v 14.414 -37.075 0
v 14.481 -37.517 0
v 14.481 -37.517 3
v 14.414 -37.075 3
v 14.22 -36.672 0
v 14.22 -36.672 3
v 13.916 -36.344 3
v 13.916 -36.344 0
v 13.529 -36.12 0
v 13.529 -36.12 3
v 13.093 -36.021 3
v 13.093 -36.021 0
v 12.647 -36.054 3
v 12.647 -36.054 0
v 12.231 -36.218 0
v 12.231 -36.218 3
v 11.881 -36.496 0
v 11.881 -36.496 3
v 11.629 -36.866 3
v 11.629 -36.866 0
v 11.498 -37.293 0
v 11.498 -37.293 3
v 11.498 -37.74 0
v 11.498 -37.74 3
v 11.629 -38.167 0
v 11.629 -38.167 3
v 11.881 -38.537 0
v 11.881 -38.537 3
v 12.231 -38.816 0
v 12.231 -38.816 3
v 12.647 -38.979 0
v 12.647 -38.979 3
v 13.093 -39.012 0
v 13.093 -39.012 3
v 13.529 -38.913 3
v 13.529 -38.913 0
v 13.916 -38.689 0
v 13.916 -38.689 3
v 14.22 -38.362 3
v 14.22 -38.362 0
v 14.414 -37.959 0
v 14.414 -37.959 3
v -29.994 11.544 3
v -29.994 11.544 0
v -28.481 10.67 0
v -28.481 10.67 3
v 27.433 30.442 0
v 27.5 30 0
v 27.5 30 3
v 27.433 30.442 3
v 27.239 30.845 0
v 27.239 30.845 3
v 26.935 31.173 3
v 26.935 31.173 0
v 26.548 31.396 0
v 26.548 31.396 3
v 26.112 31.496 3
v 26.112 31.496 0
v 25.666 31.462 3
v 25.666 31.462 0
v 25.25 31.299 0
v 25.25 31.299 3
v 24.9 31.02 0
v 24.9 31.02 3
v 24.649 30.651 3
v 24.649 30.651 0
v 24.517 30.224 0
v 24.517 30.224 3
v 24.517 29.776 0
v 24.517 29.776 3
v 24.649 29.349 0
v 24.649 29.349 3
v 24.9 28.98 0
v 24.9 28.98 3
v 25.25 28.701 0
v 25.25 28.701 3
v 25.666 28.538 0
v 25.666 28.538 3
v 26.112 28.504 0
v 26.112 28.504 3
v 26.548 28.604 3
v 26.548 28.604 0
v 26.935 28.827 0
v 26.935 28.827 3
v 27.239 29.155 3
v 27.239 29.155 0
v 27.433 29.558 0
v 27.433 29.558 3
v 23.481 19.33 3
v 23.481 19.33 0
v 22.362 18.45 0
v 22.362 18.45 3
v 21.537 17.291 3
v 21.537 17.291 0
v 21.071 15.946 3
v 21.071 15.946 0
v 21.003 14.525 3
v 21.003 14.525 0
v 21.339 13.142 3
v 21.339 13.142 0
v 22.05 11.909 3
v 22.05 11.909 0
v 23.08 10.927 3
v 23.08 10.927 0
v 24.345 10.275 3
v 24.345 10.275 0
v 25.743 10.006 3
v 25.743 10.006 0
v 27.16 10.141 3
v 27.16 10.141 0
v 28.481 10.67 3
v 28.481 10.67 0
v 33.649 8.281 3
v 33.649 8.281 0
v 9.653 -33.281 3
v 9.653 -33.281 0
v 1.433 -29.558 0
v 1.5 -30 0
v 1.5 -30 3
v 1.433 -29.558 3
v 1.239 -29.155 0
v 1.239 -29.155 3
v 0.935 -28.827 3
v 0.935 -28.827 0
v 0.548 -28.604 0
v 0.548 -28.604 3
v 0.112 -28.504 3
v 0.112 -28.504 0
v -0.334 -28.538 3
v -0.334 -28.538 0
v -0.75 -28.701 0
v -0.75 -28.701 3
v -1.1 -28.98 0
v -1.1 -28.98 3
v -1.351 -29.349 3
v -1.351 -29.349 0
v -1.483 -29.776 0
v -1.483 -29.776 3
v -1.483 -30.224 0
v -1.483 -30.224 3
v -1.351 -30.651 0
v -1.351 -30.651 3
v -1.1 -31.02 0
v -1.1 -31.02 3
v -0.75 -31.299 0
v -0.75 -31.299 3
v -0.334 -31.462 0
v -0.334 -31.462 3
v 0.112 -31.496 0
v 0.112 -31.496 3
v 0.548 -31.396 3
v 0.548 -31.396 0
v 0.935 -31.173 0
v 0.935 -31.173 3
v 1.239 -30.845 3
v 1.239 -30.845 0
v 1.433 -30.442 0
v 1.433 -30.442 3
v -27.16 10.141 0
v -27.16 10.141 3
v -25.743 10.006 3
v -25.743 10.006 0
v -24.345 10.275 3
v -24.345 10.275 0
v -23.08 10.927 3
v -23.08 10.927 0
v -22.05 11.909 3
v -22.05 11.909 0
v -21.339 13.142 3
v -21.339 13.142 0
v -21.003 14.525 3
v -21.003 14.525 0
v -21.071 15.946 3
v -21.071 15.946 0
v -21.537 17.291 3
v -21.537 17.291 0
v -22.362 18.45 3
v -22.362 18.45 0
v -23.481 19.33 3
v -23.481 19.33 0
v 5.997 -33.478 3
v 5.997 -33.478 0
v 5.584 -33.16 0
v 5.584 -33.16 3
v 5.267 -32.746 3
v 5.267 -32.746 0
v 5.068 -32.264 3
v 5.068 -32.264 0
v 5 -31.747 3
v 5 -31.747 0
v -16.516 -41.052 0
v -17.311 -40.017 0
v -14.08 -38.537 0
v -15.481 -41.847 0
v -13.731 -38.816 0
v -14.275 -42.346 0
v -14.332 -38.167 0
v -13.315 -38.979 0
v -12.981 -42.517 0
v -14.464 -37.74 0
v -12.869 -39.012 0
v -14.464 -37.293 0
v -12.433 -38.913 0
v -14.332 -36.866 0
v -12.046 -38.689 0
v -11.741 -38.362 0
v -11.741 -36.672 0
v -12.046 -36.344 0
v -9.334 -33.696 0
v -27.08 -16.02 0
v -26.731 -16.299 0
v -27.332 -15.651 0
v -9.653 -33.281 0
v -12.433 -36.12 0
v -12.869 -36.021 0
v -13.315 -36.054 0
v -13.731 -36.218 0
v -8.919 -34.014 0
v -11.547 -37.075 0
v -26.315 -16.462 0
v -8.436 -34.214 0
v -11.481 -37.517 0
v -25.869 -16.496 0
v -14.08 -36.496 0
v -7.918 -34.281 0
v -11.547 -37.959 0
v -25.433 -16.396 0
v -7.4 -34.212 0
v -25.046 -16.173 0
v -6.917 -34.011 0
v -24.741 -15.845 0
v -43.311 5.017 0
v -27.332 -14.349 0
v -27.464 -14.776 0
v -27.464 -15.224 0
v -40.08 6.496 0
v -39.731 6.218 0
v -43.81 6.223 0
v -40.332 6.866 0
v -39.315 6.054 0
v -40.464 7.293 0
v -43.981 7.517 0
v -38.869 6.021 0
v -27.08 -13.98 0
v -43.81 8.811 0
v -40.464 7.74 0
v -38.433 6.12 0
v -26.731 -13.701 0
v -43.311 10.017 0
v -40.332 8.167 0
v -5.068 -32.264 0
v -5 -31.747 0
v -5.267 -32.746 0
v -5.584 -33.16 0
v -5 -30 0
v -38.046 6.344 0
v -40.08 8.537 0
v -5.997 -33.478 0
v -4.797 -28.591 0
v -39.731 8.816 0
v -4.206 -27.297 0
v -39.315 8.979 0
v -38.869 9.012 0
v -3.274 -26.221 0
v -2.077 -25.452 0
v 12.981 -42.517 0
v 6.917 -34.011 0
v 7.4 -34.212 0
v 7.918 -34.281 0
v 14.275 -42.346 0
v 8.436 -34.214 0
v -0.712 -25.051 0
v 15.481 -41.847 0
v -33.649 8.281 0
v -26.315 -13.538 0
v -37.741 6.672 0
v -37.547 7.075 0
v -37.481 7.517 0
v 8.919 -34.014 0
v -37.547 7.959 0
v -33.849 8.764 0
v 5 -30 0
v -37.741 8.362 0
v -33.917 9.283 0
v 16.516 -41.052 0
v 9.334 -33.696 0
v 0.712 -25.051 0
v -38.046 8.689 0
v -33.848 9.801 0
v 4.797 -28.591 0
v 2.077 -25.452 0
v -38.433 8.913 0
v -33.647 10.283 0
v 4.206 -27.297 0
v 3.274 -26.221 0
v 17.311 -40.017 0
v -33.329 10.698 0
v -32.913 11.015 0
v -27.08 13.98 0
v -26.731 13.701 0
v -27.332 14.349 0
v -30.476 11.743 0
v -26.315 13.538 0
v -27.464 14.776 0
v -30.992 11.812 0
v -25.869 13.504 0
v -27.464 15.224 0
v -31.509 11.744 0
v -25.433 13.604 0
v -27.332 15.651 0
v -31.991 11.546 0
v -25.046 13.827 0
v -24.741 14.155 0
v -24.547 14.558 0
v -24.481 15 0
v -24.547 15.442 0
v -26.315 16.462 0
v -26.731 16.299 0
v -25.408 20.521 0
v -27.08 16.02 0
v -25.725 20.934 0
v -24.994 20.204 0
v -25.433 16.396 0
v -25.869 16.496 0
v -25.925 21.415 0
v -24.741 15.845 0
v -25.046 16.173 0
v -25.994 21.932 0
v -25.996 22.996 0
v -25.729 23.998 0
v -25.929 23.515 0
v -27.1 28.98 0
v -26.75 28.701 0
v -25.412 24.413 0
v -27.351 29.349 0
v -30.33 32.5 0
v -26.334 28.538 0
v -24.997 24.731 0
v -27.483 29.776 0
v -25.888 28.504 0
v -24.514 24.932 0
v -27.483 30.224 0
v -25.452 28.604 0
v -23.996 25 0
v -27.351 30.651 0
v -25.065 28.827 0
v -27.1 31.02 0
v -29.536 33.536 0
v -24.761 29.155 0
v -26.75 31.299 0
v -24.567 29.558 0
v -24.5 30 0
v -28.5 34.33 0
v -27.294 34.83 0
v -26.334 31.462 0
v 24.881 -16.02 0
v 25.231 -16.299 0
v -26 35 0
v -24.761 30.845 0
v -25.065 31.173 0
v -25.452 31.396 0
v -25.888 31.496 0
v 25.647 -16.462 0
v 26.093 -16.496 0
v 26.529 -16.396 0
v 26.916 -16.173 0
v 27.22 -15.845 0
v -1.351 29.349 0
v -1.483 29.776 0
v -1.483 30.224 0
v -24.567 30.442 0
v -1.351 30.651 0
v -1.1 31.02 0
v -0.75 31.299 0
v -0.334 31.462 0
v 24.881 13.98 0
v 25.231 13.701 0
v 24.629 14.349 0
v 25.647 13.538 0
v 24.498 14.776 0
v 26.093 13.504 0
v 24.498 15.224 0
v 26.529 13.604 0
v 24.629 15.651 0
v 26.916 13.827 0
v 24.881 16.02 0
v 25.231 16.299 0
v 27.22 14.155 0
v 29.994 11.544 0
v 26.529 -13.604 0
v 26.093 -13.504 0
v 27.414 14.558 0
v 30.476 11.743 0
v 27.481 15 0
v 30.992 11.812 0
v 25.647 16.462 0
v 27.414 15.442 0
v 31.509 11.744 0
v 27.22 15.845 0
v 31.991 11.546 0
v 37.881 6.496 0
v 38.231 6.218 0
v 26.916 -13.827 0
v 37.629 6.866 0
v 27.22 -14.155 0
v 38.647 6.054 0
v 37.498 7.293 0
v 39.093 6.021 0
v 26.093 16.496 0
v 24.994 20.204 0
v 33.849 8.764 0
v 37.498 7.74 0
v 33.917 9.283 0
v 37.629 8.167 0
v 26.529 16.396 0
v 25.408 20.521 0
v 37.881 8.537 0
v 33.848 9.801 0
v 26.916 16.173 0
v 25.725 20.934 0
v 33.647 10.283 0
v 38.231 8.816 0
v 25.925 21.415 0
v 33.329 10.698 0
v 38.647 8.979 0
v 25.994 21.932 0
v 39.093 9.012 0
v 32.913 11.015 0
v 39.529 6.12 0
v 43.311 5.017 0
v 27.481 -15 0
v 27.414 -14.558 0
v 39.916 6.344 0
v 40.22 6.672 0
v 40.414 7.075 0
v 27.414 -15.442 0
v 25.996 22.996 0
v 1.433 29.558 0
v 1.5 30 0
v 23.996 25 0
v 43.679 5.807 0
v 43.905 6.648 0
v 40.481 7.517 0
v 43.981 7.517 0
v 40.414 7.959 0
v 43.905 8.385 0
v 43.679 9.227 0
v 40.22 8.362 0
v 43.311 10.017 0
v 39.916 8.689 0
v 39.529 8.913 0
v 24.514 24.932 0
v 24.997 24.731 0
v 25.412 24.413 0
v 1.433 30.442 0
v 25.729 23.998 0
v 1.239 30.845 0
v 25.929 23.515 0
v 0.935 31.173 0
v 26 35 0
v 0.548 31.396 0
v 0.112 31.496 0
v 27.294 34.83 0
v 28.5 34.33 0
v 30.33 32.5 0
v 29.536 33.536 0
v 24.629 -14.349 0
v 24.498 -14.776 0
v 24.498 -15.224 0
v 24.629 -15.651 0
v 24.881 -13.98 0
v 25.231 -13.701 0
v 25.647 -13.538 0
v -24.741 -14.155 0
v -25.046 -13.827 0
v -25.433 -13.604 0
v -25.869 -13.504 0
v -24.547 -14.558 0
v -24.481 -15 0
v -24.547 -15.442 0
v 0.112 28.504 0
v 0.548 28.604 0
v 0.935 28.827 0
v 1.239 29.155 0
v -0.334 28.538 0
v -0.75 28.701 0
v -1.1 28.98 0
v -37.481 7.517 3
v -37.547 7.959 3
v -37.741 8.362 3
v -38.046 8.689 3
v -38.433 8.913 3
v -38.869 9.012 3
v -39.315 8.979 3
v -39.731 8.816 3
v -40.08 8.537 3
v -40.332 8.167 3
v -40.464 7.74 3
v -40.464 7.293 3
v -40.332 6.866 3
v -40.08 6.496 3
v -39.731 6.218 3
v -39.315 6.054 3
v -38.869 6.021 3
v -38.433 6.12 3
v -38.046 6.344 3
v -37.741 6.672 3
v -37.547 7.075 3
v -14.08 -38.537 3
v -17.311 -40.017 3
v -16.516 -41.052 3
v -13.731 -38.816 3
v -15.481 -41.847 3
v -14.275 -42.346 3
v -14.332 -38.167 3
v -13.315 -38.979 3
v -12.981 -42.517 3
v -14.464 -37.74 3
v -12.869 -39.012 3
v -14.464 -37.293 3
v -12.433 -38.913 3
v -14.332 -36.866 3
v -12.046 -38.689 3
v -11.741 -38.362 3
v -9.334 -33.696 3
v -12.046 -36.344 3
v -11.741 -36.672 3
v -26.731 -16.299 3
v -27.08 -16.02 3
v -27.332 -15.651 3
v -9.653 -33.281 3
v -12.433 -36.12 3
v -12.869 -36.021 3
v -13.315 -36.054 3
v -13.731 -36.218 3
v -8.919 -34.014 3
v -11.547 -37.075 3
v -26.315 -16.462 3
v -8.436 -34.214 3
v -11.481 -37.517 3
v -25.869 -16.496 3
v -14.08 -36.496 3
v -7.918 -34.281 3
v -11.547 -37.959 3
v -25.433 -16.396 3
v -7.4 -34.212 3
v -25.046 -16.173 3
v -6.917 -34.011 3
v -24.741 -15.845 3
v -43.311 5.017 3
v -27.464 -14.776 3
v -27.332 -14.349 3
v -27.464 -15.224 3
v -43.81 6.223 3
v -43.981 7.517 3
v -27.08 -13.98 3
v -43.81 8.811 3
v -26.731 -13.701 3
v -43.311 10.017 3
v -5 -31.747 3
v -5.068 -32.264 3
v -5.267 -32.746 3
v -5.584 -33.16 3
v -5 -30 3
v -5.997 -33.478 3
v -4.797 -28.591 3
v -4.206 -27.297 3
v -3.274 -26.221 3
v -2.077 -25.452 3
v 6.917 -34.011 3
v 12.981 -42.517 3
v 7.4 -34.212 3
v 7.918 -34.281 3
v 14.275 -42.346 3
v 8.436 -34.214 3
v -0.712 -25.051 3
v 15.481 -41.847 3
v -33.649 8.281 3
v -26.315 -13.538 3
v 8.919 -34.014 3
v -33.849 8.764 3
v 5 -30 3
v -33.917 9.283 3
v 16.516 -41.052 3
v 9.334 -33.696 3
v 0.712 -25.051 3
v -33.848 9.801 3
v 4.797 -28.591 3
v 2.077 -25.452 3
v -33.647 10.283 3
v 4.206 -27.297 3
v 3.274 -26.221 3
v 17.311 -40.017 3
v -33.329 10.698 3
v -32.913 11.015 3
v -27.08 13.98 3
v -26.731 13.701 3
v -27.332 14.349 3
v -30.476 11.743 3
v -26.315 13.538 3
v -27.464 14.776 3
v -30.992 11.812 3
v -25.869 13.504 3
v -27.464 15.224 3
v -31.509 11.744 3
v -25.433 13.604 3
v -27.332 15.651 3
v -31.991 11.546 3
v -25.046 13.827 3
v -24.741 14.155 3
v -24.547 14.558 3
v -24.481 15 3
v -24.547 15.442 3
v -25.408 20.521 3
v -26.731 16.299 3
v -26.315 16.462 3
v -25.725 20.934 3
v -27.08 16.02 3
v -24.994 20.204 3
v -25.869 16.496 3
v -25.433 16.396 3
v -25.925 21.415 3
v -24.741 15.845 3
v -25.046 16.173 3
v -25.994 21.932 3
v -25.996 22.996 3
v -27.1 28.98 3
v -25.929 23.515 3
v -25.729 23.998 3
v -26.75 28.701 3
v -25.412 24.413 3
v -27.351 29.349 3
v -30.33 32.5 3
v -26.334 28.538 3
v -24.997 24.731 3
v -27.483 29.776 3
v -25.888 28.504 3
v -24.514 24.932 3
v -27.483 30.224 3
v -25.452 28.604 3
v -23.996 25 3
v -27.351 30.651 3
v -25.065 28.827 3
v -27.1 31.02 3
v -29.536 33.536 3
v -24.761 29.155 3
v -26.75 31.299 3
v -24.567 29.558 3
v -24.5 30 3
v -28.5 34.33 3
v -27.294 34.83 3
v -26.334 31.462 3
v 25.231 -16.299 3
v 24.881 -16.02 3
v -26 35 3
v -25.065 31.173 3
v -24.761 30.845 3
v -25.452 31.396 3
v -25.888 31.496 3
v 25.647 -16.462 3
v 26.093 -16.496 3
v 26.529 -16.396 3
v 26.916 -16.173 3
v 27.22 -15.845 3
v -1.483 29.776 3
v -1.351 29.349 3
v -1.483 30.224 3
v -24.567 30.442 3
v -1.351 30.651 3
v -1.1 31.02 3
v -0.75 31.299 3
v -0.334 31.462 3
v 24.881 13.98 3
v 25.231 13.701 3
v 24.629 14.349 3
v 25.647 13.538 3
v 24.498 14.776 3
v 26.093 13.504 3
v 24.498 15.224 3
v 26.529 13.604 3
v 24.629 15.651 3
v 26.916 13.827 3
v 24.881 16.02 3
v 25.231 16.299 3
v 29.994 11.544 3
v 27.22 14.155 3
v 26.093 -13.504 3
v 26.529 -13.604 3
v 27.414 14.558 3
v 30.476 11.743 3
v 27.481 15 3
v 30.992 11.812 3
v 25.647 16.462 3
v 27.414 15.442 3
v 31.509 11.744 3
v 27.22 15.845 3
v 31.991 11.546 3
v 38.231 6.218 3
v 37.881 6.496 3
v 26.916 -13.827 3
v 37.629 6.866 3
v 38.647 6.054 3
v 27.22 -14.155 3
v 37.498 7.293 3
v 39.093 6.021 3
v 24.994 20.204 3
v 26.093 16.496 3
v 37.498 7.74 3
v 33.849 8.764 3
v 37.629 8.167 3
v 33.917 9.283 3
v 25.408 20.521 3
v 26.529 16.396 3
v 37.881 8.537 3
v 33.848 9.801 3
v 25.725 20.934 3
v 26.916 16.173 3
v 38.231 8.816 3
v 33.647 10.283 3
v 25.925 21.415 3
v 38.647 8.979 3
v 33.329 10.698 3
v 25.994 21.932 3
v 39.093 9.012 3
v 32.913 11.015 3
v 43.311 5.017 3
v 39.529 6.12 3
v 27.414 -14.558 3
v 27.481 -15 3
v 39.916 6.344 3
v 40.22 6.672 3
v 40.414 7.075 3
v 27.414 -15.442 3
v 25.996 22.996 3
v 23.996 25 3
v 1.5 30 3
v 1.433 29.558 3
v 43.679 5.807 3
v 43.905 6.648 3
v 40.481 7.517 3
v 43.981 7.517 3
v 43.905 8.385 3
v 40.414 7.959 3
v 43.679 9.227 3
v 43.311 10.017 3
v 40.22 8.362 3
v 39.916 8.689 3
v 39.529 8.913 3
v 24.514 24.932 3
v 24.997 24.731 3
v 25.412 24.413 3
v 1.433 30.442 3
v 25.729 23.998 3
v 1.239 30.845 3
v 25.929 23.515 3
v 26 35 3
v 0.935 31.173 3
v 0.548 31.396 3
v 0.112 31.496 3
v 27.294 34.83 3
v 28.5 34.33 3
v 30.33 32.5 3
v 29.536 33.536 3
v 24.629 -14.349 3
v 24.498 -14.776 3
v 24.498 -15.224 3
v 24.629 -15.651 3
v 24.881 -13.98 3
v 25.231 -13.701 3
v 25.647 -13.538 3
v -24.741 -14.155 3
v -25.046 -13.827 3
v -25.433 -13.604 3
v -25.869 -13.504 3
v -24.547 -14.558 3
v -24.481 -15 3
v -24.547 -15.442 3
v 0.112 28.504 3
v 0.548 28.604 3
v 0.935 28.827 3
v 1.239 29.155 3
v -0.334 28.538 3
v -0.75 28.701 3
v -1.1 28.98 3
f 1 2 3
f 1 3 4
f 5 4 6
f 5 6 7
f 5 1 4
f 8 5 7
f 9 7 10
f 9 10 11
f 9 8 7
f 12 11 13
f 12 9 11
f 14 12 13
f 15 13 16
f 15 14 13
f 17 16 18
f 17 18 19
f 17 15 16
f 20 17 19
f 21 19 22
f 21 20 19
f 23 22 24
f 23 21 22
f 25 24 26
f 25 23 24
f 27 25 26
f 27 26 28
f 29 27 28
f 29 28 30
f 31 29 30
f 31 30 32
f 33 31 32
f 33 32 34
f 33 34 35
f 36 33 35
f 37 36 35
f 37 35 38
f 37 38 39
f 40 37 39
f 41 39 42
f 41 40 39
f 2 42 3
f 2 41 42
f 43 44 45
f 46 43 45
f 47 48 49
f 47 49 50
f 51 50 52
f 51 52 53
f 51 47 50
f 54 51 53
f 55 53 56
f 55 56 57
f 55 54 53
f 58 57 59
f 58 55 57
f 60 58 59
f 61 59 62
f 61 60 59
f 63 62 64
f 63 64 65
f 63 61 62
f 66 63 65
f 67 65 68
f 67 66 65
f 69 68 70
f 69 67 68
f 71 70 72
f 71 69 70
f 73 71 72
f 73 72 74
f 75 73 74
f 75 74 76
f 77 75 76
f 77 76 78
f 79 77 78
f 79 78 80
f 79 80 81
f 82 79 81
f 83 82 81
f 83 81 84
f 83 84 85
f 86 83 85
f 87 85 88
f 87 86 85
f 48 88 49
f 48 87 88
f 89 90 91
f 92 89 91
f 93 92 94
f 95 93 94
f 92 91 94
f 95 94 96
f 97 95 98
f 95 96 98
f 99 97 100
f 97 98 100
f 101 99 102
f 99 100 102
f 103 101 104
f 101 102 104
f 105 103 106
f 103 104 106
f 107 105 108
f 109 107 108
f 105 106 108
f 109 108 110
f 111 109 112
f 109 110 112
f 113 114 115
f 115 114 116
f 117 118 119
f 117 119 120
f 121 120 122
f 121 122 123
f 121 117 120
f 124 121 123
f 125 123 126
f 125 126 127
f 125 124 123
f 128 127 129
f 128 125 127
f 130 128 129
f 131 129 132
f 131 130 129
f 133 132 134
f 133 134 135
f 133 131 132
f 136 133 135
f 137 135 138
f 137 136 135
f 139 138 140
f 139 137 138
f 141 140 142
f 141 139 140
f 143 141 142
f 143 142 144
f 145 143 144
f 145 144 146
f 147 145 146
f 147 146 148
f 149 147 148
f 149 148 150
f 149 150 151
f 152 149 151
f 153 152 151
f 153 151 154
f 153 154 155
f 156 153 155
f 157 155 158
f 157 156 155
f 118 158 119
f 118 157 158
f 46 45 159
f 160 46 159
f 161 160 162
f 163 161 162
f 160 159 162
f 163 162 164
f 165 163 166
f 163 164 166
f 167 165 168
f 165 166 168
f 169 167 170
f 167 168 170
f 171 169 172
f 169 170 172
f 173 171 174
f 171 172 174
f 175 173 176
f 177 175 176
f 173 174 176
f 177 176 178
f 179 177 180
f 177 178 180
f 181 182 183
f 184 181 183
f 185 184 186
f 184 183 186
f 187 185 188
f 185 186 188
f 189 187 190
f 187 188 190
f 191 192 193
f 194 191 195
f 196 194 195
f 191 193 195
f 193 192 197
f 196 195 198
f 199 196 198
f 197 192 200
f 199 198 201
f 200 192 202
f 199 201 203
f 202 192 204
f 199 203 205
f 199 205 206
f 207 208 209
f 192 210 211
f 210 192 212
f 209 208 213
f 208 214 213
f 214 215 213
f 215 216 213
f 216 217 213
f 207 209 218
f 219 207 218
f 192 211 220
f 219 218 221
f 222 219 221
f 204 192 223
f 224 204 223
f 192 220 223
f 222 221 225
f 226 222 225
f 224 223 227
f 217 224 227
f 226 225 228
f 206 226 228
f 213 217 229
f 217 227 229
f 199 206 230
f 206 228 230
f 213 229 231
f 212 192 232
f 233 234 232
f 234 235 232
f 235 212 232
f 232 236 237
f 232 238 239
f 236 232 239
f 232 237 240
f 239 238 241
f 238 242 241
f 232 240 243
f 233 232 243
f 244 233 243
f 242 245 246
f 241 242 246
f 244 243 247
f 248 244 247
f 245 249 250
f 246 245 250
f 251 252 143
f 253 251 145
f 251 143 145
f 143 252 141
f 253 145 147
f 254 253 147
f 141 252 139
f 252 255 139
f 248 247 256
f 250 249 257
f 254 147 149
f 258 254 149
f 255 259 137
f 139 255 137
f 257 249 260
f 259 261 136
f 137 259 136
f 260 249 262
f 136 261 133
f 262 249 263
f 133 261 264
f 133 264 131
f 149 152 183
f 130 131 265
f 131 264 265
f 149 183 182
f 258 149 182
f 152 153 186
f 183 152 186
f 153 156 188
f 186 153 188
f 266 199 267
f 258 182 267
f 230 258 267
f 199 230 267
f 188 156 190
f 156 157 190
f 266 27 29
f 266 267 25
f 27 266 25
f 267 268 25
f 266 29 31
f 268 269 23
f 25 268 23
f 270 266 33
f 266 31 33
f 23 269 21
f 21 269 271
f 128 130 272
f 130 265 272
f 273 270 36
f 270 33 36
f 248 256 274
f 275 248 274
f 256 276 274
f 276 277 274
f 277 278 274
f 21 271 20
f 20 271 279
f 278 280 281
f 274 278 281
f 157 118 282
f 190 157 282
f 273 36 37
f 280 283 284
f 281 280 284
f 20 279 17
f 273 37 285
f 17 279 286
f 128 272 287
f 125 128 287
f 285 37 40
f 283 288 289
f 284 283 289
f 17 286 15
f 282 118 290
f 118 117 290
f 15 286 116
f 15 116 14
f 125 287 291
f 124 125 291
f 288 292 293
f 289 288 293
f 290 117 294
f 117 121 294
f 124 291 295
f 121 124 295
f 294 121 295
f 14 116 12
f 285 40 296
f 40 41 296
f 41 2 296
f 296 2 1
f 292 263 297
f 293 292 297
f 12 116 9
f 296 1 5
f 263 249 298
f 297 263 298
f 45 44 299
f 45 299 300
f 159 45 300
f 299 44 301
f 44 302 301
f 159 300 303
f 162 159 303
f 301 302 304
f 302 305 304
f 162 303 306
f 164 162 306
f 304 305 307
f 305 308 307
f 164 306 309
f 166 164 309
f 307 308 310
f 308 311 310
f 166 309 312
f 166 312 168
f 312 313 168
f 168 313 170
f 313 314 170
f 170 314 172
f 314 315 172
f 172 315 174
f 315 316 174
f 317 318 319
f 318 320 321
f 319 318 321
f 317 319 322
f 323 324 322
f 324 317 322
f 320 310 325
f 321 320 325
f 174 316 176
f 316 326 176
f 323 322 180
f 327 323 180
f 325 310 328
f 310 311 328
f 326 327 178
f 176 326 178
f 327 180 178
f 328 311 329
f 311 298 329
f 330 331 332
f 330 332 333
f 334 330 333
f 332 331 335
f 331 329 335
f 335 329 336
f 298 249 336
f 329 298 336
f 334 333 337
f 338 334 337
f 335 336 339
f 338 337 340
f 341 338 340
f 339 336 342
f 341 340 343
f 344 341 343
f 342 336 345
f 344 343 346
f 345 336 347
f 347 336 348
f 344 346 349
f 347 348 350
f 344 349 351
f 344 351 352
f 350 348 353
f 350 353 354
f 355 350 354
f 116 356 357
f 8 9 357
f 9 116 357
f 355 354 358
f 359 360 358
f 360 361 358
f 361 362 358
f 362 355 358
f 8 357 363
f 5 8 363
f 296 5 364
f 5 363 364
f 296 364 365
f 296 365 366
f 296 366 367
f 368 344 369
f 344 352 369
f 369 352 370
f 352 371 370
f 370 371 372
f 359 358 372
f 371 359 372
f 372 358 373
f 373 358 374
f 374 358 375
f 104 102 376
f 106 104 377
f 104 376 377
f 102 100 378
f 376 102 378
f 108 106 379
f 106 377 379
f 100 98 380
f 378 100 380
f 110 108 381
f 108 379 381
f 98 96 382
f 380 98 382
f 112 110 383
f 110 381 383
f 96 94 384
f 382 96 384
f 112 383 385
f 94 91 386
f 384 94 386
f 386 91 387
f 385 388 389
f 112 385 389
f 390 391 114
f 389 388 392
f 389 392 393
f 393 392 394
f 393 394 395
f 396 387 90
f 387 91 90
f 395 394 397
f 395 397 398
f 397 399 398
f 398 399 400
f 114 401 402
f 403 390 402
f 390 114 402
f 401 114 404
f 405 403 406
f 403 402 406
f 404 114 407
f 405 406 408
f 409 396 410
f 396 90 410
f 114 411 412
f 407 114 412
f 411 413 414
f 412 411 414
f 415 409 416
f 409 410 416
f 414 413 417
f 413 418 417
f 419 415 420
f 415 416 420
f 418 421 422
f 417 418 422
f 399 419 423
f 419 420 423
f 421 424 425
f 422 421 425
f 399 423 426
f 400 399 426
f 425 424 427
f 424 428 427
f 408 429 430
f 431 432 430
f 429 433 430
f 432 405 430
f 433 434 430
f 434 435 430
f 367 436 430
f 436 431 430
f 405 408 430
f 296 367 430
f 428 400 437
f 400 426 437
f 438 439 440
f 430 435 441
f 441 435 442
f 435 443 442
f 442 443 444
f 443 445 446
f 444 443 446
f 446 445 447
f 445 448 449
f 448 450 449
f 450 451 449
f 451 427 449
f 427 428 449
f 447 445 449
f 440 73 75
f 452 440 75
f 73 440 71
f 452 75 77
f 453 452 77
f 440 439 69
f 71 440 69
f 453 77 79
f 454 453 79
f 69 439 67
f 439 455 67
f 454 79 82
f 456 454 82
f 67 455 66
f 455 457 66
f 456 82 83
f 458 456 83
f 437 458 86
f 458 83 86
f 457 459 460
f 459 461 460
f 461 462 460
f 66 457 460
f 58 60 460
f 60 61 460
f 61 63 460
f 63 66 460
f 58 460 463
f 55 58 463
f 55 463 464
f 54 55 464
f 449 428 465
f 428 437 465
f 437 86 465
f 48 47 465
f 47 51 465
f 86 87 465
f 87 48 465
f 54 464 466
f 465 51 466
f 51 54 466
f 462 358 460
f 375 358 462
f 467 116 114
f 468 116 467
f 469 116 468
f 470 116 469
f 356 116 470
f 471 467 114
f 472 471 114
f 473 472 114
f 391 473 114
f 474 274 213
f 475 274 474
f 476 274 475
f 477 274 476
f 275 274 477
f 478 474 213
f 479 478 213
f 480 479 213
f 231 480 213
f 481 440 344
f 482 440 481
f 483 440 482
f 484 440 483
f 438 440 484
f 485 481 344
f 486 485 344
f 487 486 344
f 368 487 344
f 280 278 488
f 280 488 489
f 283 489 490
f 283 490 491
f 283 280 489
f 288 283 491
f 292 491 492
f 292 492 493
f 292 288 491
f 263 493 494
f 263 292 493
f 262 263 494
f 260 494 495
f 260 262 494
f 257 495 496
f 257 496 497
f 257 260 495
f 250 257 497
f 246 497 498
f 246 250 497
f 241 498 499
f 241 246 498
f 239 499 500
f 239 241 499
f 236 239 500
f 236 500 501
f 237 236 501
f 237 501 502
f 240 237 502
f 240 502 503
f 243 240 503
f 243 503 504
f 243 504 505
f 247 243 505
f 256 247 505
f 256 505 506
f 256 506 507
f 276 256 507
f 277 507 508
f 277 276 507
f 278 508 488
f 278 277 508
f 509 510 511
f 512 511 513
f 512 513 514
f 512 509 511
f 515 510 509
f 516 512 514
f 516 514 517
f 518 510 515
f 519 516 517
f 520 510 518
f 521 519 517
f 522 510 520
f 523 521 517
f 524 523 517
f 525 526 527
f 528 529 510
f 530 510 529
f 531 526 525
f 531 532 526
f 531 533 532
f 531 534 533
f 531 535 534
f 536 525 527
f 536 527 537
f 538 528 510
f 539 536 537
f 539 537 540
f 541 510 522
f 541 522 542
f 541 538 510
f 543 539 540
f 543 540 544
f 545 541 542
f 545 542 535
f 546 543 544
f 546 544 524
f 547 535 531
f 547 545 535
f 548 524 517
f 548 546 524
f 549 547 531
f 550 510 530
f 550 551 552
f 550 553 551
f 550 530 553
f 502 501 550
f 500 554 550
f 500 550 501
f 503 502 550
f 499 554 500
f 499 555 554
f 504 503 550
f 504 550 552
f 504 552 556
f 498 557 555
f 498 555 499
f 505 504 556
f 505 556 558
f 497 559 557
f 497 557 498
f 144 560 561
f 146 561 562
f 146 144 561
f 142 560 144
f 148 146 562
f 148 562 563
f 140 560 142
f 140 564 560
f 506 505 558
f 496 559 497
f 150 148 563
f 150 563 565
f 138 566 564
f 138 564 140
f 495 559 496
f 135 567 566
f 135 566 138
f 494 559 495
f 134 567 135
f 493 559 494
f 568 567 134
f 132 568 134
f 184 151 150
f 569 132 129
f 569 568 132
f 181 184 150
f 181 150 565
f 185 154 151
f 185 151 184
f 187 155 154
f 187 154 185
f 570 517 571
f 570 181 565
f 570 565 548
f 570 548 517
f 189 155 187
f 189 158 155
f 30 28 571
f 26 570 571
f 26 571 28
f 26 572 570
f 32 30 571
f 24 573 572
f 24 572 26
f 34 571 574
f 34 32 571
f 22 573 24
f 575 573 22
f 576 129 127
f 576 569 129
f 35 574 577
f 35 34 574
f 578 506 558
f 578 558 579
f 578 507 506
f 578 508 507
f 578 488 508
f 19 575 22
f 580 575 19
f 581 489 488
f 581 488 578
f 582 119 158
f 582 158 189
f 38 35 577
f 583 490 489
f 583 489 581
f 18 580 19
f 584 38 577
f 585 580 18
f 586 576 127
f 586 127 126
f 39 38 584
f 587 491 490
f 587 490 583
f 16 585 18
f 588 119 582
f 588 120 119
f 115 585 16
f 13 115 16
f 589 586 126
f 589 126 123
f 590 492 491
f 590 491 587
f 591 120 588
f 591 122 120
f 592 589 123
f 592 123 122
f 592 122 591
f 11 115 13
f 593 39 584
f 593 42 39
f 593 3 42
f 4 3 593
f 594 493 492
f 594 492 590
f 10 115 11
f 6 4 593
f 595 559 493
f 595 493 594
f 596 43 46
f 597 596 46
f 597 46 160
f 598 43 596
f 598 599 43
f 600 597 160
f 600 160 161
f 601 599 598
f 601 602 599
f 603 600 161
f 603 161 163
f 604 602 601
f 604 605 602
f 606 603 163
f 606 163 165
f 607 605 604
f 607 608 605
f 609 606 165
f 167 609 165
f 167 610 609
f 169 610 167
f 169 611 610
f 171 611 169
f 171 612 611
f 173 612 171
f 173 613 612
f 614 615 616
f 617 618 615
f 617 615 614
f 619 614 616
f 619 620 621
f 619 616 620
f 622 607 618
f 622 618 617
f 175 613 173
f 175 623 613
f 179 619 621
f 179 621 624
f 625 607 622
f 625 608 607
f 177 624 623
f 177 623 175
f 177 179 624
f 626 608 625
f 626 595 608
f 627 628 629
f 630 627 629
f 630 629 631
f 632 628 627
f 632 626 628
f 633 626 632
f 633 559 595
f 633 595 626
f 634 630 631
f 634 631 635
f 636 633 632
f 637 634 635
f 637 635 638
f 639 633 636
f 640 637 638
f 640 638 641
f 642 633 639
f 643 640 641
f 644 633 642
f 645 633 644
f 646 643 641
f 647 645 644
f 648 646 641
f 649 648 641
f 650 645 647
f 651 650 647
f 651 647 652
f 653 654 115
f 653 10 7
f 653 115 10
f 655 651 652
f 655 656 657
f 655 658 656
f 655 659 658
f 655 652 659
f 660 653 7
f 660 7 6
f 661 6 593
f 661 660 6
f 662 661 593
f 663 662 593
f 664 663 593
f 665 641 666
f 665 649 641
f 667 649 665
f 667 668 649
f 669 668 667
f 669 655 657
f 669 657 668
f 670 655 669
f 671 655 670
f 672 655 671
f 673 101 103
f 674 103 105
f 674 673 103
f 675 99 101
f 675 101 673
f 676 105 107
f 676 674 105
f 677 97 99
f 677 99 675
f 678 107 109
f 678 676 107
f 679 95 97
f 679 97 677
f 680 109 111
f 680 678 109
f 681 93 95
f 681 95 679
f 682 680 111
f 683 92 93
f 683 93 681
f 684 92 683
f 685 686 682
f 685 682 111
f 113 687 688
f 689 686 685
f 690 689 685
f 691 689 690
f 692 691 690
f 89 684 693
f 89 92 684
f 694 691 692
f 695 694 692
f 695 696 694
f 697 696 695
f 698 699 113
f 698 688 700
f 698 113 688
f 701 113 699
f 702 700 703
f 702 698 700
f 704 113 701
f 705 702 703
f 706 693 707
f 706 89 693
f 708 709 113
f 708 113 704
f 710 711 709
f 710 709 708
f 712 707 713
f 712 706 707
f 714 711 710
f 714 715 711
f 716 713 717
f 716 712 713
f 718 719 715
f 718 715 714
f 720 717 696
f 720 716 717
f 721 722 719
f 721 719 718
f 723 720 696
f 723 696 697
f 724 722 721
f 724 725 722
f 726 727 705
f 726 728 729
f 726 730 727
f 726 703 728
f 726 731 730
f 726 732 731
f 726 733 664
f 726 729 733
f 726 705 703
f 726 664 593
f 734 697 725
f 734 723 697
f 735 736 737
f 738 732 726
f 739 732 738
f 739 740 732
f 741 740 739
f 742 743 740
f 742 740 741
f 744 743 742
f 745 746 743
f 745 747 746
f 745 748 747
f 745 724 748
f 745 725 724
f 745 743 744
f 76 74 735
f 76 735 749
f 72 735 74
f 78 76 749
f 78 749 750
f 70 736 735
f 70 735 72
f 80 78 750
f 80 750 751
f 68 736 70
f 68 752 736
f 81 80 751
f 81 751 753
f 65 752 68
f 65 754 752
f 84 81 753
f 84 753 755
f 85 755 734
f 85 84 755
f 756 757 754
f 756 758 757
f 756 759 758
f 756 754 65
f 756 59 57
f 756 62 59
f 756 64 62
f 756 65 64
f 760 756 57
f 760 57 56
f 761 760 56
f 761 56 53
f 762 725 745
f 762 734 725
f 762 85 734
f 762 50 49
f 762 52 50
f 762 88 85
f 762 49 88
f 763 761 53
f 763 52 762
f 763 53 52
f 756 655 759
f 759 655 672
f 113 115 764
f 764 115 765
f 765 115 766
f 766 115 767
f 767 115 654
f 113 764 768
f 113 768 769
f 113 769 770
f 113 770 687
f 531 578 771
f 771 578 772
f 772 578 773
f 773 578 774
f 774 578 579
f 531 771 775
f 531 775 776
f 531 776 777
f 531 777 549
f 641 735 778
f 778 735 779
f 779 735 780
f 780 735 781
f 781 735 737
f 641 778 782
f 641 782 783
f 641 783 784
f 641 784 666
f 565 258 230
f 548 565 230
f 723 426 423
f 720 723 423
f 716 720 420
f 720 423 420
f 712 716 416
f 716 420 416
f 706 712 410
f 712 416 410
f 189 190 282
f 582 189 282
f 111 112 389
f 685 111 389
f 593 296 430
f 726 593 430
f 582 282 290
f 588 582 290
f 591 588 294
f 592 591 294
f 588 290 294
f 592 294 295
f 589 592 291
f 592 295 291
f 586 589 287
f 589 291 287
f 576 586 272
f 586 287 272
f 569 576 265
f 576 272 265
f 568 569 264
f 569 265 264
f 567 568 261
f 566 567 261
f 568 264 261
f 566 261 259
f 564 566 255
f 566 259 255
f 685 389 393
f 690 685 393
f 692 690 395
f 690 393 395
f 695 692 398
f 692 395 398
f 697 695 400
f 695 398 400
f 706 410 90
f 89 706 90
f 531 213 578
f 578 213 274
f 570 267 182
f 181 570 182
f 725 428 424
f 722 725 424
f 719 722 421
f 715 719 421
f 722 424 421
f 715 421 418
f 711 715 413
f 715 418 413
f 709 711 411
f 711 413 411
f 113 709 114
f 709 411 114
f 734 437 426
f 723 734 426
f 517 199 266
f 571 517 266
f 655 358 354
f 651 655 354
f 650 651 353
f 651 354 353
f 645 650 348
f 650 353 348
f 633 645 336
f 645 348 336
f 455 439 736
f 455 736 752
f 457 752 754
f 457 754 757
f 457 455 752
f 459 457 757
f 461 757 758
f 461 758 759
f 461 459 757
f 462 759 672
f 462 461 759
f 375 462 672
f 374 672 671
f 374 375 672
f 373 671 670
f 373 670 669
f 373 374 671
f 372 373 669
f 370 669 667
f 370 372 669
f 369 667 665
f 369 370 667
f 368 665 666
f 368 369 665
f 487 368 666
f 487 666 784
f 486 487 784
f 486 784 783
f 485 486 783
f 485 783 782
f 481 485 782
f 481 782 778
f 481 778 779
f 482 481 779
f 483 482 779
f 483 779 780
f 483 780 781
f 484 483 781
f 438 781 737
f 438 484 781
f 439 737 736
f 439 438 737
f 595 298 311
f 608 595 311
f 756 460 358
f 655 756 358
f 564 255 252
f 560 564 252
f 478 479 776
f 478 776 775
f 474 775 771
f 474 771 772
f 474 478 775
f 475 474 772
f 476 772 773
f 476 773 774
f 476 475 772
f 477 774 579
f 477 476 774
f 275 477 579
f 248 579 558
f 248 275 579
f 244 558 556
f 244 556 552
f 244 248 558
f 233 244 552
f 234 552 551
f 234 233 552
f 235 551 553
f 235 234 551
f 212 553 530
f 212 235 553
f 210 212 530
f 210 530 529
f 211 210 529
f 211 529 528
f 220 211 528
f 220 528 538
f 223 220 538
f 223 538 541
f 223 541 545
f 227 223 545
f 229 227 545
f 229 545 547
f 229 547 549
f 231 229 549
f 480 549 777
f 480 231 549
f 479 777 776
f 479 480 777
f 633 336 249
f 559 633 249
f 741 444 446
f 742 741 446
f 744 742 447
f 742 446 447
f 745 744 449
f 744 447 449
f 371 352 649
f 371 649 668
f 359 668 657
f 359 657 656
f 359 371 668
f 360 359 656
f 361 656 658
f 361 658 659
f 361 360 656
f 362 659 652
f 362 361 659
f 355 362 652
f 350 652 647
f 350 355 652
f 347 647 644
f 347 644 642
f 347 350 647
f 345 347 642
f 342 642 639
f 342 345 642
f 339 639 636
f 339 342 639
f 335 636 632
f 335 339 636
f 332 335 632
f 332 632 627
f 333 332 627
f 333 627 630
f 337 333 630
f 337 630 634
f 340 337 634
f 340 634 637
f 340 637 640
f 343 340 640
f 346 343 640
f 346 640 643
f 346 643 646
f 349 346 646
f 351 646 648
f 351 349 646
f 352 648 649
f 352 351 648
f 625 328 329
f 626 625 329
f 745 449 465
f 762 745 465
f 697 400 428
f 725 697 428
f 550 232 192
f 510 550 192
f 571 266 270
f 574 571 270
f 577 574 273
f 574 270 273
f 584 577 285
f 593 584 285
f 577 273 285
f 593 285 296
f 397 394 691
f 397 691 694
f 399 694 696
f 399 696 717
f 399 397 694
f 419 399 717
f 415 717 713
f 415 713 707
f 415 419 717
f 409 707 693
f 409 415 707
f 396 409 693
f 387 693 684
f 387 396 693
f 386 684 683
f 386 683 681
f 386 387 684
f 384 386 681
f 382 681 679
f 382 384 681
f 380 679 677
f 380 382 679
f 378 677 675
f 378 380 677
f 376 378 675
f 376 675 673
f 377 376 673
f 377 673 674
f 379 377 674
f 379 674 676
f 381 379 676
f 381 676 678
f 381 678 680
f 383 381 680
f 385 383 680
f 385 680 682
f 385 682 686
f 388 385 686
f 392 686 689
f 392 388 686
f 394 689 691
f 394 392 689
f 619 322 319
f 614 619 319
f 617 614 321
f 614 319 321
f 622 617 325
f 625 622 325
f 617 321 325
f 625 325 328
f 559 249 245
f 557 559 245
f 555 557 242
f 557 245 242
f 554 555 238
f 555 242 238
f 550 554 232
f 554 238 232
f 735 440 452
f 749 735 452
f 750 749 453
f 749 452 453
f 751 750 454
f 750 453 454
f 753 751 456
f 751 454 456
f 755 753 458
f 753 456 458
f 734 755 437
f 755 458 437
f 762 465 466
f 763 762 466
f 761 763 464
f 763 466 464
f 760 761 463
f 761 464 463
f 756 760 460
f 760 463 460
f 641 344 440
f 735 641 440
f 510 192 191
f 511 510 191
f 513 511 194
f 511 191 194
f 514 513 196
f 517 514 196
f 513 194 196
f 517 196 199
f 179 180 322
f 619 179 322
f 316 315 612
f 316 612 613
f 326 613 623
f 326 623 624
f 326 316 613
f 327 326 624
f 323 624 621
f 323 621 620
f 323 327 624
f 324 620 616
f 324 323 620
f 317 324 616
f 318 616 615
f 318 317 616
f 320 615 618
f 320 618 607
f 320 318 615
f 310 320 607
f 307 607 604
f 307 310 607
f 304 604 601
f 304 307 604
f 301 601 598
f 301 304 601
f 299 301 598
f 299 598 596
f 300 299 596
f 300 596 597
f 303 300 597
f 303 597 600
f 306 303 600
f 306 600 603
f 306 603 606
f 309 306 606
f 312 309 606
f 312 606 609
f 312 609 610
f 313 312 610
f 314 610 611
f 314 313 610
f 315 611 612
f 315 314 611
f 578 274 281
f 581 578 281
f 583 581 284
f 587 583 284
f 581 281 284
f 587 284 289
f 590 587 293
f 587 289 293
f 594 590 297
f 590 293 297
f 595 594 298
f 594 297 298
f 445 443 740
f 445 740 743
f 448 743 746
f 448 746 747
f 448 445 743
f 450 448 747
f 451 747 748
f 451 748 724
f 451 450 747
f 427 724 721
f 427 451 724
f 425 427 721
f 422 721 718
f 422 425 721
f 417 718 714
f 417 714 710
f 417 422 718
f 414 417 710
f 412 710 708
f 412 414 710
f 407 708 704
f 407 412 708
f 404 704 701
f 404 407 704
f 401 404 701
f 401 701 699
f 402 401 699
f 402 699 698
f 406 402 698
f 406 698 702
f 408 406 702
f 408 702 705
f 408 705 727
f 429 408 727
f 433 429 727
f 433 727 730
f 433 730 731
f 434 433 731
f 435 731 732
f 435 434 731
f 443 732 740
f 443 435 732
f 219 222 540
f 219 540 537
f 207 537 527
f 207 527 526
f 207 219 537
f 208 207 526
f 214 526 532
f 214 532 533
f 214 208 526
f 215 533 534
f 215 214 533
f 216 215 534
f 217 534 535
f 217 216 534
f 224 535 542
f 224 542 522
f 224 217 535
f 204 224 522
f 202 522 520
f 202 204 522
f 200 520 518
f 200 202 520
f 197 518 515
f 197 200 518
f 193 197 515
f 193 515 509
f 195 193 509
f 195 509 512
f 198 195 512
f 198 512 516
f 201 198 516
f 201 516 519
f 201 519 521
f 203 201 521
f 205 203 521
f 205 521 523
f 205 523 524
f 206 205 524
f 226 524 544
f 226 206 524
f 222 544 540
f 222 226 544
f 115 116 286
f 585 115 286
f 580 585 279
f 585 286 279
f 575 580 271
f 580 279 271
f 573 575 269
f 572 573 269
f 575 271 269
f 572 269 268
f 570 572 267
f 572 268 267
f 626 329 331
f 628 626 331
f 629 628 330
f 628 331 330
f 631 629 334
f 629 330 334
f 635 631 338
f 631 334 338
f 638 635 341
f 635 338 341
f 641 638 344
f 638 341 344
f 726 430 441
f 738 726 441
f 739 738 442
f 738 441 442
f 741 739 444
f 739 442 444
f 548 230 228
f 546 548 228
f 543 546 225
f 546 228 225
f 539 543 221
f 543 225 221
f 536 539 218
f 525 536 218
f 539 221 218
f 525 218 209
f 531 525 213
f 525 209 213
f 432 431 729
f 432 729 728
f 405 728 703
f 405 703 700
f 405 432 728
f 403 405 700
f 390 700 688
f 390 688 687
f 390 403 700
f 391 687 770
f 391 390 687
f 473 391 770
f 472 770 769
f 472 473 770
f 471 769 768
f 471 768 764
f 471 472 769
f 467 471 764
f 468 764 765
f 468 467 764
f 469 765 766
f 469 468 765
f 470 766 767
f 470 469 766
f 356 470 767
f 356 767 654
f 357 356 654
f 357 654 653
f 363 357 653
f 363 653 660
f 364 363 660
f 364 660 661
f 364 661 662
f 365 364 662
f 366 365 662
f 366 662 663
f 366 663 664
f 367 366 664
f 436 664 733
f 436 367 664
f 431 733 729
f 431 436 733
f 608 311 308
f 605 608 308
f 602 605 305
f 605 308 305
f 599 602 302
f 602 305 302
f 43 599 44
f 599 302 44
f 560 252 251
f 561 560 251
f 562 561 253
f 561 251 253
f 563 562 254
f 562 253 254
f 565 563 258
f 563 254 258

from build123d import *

# Parameters (mm, degrees)
F0_R     = 1.5
F1_DEPTH = 3


with BuildPart() as f1:
    # F0 (on Top) → F1 (new body)
    with BuildSketch(Plane.XY):
        with BuildLine():
            ThreePointArc((26, 35), (22.464466, 26.464466), (31, 30))
            ThreePointArc((31, 30), (30.829629, 31.294095), (30.330127, 32.5))
            ThreePointArc((30.330127, 32.5), (28.5, 34.330127), (26, 35))
        make_face()
        with Locations((26, 30)):
            Circle(F0_R, mode=Mode.SUBTRACT)
        with BuildLine():
            ThreePointArc((30.330127, 32.5), (30.829629, 31.294095), (31, 30))
            ThreePointArc((31, 30), (22.464466, 26.464466), (26, 35))
            Line((26, 35), (-26, 35))
            ThreePointArc((-26, 35), (-22.464466, 33.535534), (-21, 30))
            ThreePointArc((-21, 30), (-27.294095, 25.170371), (-30.330127, 32.5))
            Line((-30.330127, 32.5), (-43.310889, 10.01666))
            ThreePointArc((-43.310889, 10.01666), (-37.686667, 12.34629), (-33.980762, 7.51666))
            ThreePointArc((-33.980762, 7.51666), (-37.686667, 2.687031), (-43.310889, 5.01666))
            Line((-43.310889, 5.01666), (-17.310889, -40.01666))
            ThreePointArc((-17.310889, -40.01666), (-14.274857, -32.687031), (-7.980762, -37.51666))
            ThreePointArc((-7.980762, -37.51666), (-9.445228, -41.052194), (-12.980762, -42.51666))
            Line((-12.980762, -42.51666), (12.980762, -42.51666))
            ThreePointArc((12.980762, -42.51666), (9.445228, -33.981127), (17.980762, -37.51666))
            ThreePointArc((17.980762, -37.51666), (17.810391, -38.810756), (17.310889, -40.01666))
            Line((17.310889, -40.01666), (43.310889, 5.01666))
            ThreePointArc((43.310889, 5.01666), (33.980762, 7.51666), (43.310889, 10.01666))
            Line((43.310889, 10.01666), (30.330127, 32.5))
        make_face()
        with Locations((-25.980762, -15)):
            Circle(F0_R, mode=Mode.SUBTRACT)
        with BuildLine():
            ThreePointArc((32.913325, 11.015246), (33.848011, 9.80077), (33.648709, 8.281274))
            Line((33.648709, 8.281274), (9.652561, -33.281274))
            ThreePointArc((9.652561, -33.281274), (8.43629, -34.213623), (6.91718, -34.011398))
            Line((6.91718, -34.011398), (5.99667, -33.477578))
            ThreePointArc((5.99667, -33.477578), (5.266988, -32.745787), (5, -31.747454))
            Line((5, -31.747454), (5, -30))
            ThreePointArc((5, -30), (0, -25), (-5, -30))
            Line((-5, -30), (-5, -31.747454))
            ThreePointArc((-5, -31.747454), (-5.266988, -32.745787), (-5.99667, -33.477578))
            Line((-5.99667, -33.477578), (-6.91718, -34.011398))
            ThreePointArc((-6.91718, -34.011398), (-8.43629, -34.213623), (-9.652561, -33.281274))
            Line((-9.652561, -33.281274), (-33.648709, 8.281274))
            ThreePointArc((-33.648709, 8.281274), (-33.848011, 9.80077), (-32.913325, 11.015246))
            Line((-32.913325, 11.015246), (-31.990768, 11.545521))
            ThreePointArc((-31.990768, 11.545521), (-30.992178, 11.811548), (-29.994102, 11.5436))
            Line((-29.994102, 11.5436), (-28.480762, 10.669873))
            ThreePointArc((-28.480762, 10.669873), (-21.650635, 12.5), (-23.480762, 19.330127))
            Line((-23.480762, 19.330127), (-24.994102, 20.203854))
            ThreePointArc((-24.994102, 20.203854), (-25.72519, 20.934239), (-25.994098, 21.932057))
            Line((-25.994098, 21.932057), (-25.996145, 22.996152))
            ThreePointArc((-25.996145, 22.996152), (-25.411722, 24.412853), (-23.996149, 25))
            Line((-23.996149, 25), (23.996149, 25))
            ThreePointArc((23.996149, 25), (25.411722, 24.412853), (25.996145, 22.996152))
            Line((25.996145, 22.996152), (25.994098, 21.932057))
            ThreePointArc((25.994098, 21.932057), (25.72519, 20.934239), (24.994102, 20.203854))
            Line((24.994102, 20.203854), (23.480762, 19.330127))
            ThreePointArc((23.480762, 19.330127), (21.650635, 12.5), (28.480762, 10.669873))
            Line((28.480762, 10.669873), (29.994102, 11.5436))
            ThreePointArc((29.994102, 11.5436), (30.992178, 11.811548), (31.990768, 11.545521))
            Line((31.990768, 11.545521), (32.913325, 11.015246))
        make_face(mode=Mode.SUBTRACT)
        with Locations((0, -30)):
            Circle(F0_R, mode=Mode.SUBTRACT)
        with Locations((25.980762, -15)):
            Circle(F0_R, mode=Mode.SUBTRACT)
        with Locations((-25.980762, 15)):
            Circle(F0_R, mode=Mode.SUBTRACT)
        with Locations((25.980762, 15)):
            Circle(F0_R, mode=Mode.SUBTRACT)
        with Locations((0, 30)):
            Circle(F0_R, mode=Mode.SUBTRACT)
        with BuildLine():
            ThreePointArc((43.980762, 7.51666), (43.810391, 8.810756), (43.310889, 10.01666))
            ThreePointArc((43.310889, 10.01666), (33.980762, 7.51666), (43.310889, 5.01666))
            ThreePointArc((43.310889, 5.01666), (43.810391, 6.222565), (43.980762, 7.51666))
        make_face()
        with Locations((38.980762, 7.51666)):
            Circle(F0_R, mode=Mode.SUBTRACT)
        with BuildLine():
            ThreePointArc((-21, 30), (-22.464466, 33.535534), (-26, 35))
            ThreePointArc((-26, 35), (-28.5, 34.330127), (-30.330127, 32.5))
            ThreePointArc((-30.330127, 32.5), (-27.294095, 25.170371), (-21, 30))
        make_face()
        with Locations((-26, 30)):
            Circle(F0_R, mode=Mode.SUBTRACT)
        with BuildLine():
            ThreePointArc((12.980762, -42.51666), (15.480762, -41.846788), (17.310889, -40.01666))
            ThreePointArc((17.310889, -40.01666), (17.810391, -38.810756), (17.980762, -37.51666))
            ThreePointArc((17.980762, -37.51666), (9.445228, -33.981127), (12.980762, -42.51666))
        make_face()
        with Locations((12.980762, -37.51666)):
            Circle(F0_R, mode=Mode.SUBTRACT)
        with BuildLine():
            ThreePointArc((-33.980762, 7.51666), (-37.686667, 12.34629), (-43.310889, 10.01666))
            ThreePointArc((-43.310889, 10.01666), (-43.980762, 7.51666), (-43.310889, 5.01666))
            ThreePointArc((-43.310889, 5.01666), (-37.686667, 2.687031), (-33.980762, 7.51666))
        make_face()
        with Locations((-38.980762, 7.51666)):
            Circle(F0_R, mode=Mode.SUBTRACT)
        with BuildLine():
            ThreePointArc((-17.310889, -40.01666), (-15.480762, -41.846788), (-12.980762, -42.51666))
            ThreePointArc((-12.980762, -42.51666), (-9.445228, -41.052194), (-7.980762, -37.51666))
            ThreePointArc((-7.980762, -37.51666), (-14.274857, -32.687031), (-17.310889, -40.01666))
        make_face()
        with Locations((-12.980762, -37.51666)):
            Circle(F0_R, mode=Mode.SUBTRACT)
    extrude(amount=F1_DEPTH)


solid = f1.part
